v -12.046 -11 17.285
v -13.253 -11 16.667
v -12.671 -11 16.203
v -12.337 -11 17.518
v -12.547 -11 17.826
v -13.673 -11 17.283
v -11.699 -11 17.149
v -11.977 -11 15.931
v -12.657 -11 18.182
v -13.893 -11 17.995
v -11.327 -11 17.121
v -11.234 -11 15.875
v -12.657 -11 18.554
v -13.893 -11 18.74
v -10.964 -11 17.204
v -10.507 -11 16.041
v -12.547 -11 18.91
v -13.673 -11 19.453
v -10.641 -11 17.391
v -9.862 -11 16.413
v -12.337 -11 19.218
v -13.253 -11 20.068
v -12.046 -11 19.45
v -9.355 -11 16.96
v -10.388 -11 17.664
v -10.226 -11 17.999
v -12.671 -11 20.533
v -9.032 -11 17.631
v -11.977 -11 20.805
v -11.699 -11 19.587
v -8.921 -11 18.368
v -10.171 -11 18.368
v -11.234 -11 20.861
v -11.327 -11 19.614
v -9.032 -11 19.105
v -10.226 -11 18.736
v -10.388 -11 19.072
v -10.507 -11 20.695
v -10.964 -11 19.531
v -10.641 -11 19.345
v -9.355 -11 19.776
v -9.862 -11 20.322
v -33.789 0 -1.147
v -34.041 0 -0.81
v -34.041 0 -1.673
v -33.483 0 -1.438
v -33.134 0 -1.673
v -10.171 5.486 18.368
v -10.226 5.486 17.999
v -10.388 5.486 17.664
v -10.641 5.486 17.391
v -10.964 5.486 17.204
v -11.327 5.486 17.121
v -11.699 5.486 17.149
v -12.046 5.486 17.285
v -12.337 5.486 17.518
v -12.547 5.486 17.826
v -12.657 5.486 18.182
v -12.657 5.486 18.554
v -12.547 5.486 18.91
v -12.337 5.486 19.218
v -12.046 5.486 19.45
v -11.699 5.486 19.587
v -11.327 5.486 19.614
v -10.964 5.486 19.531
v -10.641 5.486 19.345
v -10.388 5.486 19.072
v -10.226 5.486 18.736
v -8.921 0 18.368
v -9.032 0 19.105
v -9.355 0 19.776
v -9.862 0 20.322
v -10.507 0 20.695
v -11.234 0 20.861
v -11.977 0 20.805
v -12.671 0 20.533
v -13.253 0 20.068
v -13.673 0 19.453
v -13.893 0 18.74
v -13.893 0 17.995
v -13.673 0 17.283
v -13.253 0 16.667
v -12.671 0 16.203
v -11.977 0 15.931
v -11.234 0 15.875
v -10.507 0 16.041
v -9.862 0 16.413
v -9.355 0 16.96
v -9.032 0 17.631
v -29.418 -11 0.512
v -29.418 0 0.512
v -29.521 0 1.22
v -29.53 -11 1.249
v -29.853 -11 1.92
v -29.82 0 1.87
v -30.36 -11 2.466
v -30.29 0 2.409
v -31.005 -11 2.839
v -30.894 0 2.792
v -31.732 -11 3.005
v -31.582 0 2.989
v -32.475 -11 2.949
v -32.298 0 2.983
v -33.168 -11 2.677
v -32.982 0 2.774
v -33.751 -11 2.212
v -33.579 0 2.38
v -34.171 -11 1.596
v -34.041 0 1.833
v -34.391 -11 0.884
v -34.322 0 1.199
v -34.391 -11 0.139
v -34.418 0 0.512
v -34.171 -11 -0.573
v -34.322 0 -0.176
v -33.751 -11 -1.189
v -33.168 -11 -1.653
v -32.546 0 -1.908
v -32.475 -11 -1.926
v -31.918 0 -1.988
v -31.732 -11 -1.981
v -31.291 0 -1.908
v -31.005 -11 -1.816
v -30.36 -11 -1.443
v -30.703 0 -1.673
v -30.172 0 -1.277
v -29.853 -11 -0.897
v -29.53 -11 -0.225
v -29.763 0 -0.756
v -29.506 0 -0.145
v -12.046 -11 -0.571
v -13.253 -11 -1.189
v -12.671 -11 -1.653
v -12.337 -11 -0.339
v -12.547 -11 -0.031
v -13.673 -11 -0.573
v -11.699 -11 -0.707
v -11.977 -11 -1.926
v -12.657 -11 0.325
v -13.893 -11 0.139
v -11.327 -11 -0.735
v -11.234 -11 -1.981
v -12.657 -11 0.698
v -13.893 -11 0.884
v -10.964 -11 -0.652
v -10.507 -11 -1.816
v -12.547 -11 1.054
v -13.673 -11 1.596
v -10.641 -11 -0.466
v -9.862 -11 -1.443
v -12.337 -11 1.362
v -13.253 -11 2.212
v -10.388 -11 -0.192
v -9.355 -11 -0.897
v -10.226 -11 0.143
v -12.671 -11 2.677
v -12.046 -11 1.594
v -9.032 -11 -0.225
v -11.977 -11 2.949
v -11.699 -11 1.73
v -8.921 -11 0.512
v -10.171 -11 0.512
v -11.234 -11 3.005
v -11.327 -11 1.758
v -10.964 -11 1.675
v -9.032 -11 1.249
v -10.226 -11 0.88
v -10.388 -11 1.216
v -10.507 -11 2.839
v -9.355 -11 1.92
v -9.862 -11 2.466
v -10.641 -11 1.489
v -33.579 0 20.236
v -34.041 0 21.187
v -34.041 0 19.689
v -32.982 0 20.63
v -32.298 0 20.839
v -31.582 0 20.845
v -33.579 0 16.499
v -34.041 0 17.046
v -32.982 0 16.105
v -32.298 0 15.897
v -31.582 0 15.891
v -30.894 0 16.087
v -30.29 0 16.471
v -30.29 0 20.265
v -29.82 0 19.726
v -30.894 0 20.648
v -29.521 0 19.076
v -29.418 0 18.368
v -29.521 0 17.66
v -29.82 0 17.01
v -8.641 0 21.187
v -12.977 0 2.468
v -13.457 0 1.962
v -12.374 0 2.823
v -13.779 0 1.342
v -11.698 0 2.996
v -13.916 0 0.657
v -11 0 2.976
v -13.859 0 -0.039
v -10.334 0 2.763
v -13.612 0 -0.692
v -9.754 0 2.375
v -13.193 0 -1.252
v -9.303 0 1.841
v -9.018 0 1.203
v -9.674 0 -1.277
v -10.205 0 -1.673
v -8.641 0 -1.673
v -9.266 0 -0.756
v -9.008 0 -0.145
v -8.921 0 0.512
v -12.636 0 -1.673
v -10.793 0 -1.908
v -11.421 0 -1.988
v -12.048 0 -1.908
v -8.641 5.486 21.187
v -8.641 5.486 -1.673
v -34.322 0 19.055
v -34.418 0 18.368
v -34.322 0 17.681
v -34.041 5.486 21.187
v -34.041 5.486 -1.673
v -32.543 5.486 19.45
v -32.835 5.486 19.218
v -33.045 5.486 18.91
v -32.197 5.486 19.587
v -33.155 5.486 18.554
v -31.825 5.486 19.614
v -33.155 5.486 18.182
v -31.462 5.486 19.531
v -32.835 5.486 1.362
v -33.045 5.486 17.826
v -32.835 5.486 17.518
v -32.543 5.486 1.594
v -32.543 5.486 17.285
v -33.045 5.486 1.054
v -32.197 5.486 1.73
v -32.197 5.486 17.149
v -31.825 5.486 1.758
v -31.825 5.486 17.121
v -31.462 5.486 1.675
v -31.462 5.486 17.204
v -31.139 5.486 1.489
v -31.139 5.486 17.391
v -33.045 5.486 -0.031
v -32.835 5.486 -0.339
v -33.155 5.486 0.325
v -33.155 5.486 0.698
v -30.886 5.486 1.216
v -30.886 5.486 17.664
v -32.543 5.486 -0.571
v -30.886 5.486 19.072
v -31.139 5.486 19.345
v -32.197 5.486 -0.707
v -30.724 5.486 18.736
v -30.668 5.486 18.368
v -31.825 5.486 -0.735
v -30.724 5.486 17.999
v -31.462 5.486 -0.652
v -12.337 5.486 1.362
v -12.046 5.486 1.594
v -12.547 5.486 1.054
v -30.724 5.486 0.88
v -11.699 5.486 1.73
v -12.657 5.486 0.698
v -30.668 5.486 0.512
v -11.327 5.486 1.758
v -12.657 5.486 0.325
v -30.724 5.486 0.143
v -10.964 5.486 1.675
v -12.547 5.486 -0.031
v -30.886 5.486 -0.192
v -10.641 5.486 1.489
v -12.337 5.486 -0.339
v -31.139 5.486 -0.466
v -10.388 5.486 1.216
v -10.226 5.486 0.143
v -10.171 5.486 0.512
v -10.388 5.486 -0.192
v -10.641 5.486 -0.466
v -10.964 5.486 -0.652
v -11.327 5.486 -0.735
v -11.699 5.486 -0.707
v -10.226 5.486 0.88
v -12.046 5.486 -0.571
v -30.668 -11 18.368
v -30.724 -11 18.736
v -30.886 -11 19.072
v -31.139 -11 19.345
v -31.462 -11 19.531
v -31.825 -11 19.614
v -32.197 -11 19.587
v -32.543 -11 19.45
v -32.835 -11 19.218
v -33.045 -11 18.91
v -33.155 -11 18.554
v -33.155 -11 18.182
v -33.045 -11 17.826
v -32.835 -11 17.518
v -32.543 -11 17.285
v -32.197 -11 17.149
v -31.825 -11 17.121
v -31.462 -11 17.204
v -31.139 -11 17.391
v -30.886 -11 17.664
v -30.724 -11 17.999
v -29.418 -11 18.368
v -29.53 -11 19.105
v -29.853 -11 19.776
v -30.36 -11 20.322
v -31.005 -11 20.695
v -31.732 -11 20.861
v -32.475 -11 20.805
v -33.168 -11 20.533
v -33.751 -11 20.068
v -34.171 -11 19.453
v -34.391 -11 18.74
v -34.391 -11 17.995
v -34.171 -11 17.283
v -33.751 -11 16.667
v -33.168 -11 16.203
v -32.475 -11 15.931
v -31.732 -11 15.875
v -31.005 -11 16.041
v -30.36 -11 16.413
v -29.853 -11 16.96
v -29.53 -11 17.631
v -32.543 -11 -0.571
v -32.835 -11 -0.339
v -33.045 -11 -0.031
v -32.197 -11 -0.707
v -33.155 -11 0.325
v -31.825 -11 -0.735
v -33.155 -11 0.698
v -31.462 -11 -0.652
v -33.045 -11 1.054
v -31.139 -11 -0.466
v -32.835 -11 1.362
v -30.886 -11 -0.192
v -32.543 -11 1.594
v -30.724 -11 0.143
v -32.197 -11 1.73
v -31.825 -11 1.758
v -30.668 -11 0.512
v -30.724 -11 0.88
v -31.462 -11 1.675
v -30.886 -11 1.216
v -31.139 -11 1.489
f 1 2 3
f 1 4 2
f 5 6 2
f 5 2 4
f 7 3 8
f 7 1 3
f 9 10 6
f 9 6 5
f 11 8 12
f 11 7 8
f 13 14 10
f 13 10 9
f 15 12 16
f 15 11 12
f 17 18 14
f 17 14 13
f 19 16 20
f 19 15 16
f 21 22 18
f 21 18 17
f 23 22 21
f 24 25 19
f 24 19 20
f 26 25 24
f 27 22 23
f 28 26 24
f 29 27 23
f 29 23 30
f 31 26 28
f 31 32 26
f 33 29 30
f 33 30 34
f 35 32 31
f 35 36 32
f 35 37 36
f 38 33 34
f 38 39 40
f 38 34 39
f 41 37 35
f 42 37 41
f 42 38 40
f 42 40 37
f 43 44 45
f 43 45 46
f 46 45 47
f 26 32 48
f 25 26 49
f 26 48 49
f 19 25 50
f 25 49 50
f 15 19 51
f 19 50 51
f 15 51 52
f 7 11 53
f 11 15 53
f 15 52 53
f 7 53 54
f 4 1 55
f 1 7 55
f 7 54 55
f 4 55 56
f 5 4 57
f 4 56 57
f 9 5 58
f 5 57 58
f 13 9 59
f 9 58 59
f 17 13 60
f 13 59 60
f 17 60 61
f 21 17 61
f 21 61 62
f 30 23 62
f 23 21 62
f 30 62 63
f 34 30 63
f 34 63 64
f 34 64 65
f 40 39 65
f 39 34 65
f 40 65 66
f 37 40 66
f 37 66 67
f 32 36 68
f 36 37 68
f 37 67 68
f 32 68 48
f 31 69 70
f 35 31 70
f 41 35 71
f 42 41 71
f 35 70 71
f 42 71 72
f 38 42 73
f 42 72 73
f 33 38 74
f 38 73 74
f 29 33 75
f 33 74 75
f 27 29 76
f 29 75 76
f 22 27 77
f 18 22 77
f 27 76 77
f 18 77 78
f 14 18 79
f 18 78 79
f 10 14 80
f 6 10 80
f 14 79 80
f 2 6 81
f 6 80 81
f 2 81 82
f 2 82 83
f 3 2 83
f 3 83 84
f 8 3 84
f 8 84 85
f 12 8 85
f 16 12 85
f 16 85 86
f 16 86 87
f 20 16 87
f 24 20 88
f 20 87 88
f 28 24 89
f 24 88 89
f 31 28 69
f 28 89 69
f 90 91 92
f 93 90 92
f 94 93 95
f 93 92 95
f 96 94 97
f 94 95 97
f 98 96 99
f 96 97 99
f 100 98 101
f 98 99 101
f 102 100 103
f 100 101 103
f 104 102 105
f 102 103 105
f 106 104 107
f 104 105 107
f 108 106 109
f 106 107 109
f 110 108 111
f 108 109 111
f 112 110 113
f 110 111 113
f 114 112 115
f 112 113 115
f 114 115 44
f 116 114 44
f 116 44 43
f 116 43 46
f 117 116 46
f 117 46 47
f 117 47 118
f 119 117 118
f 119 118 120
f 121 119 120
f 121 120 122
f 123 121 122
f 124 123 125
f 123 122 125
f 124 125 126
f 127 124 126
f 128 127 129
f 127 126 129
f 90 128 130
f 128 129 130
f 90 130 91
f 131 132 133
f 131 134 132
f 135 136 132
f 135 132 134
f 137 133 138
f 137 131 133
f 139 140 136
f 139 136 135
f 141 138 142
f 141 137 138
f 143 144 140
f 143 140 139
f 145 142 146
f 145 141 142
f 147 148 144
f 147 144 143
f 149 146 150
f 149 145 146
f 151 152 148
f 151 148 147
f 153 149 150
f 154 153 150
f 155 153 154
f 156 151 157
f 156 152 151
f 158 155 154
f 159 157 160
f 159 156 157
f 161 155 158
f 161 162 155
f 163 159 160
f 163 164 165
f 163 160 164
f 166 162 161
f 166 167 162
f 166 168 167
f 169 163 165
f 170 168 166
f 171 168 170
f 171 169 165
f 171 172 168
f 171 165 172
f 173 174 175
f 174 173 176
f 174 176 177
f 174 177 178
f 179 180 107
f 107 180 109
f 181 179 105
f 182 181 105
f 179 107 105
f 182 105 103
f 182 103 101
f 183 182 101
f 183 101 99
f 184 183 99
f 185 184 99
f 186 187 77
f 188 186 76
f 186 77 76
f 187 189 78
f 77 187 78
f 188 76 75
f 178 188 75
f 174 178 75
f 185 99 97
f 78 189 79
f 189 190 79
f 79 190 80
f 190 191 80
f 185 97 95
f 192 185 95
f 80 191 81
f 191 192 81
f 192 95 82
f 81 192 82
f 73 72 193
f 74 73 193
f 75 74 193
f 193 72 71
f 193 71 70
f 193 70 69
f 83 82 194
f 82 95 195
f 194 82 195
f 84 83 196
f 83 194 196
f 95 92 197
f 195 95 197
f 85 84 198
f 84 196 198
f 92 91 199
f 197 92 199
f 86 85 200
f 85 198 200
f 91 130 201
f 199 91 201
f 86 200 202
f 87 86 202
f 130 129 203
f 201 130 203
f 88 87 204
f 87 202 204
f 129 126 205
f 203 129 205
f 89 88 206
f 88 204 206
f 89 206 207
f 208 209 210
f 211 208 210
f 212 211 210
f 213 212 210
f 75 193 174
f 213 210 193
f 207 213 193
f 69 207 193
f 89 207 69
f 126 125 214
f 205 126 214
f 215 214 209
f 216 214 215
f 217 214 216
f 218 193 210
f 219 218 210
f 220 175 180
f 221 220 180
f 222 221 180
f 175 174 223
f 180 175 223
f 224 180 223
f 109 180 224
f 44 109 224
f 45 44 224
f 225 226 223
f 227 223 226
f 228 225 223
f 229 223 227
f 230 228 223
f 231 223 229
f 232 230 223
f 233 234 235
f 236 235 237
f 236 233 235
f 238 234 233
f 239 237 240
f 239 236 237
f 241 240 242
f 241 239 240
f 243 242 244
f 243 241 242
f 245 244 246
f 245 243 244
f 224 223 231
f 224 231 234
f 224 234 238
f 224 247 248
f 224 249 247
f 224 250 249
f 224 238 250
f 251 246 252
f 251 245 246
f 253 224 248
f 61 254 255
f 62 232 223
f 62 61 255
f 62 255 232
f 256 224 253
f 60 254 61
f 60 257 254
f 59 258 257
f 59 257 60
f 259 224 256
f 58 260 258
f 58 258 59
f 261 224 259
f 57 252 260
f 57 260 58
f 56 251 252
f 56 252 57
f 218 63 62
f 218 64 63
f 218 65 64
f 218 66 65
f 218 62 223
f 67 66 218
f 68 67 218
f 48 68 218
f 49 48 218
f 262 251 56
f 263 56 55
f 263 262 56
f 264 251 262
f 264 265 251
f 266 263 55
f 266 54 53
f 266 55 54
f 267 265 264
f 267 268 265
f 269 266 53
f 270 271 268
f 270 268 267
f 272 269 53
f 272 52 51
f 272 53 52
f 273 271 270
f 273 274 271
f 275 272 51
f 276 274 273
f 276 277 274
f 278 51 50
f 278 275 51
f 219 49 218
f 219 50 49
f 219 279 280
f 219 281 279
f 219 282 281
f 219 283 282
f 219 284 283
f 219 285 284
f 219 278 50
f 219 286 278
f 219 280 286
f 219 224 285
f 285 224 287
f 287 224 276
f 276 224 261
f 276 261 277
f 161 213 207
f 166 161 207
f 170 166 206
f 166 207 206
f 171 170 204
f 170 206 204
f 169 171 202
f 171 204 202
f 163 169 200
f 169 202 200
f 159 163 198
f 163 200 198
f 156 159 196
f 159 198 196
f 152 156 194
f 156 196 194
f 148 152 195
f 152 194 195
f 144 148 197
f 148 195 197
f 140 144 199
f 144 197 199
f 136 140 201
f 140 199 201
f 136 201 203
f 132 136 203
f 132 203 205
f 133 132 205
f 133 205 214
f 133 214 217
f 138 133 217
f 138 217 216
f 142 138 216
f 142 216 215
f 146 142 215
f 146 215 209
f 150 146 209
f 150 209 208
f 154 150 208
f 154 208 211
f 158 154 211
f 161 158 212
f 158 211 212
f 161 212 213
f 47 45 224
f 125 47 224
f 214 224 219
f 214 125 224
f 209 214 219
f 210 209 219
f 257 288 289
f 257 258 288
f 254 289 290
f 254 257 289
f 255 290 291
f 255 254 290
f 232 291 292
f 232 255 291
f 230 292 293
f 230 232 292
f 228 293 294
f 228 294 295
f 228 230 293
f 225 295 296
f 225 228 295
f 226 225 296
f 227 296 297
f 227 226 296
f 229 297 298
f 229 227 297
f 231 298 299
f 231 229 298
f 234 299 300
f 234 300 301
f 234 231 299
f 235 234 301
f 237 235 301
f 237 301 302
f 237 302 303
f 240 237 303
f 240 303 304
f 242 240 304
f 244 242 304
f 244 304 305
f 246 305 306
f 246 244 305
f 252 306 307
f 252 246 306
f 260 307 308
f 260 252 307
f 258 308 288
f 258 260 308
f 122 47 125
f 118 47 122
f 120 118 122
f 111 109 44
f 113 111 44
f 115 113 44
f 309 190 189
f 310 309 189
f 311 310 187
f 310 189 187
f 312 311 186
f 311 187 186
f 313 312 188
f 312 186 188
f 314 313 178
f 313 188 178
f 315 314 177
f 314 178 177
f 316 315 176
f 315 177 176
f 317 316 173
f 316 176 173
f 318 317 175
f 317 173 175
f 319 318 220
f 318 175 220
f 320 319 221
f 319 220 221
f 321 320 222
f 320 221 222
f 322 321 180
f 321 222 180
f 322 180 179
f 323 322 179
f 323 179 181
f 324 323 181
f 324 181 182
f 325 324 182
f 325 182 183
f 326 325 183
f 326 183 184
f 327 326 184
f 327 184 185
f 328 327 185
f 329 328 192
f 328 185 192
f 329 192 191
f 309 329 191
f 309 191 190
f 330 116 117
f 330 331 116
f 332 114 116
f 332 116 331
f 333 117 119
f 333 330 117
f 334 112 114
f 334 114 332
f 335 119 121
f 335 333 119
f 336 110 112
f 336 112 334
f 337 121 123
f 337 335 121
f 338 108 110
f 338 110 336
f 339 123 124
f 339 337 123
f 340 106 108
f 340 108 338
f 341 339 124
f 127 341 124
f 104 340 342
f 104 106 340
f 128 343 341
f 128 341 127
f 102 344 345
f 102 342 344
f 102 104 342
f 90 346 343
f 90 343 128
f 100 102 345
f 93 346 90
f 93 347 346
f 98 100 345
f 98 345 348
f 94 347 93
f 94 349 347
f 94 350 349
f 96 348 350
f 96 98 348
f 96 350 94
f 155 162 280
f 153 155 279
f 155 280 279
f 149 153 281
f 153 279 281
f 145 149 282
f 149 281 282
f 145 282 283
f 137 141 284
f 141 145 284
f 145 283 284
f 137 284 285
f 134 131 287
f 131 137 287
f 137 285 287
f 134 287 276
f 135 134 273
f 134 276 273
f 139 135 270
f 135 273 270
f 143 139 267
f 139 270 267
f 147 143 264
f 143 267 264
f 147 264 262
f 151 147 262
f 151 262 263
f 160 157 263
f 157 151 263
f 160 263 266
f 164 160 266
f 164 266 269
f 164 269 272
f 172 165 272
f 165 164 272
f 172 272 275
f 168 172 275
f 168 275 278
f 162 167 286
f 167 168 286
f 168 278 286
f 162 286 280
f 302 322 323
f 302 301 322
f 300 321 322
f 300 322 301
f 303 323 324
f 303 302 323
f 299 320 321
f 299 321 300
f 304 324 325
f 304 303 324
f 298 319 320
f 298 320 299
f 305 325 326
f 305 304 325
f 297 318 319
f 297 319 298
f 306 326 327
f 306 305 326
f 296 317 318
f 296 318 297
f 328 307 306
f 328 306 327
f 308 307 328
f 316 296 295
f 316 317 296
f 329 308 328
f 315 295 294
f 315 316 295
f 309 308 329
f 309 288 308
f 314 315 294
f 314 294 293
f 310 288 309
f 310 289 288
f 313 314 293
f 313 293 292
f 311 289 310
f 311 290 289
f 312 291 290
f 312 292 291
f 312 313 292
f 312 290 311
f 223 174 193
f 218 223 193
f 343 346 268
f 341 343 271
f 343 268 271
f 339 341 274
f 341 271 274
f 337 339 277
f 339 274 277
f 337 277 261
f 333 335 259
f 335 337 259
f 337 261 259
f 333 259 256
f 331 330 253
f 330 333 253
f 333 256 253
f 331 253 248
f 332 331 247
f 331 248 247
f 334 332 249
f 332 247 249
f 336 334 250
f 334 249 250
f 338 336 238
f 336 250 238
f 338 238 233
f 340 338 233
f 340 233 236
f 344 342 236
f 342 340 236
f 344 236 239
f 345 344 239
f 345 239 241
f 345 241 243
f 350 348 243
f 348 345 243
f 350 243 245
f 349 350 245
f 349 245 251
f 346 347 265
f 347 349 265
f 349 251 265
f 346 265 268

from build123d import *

# Parameters (mm, degrees)
SKETCH1_W               = 25.4
SKETCH1_H               = 22.86
BOSS_EXTRUDE1_DEPTH     = 5.4864
SKETCH2_R               = 2.5
SKETCH2_R_2             = 1.25
BOSS_EXTRUDE2_DEPTH     = 11
SKETCH5_R               = 1.25
CUT_EXTRUDE1_DEPTH      = 1
CUT_EXTRUDE1_DEPTH_BACK = 17.4864


with BuildPart() as part:
    # Sketch1 → Boss-Extrude1 (new body)
    with BuildSketch(Plane(origin=(0, 0, 0), x_dir=(1, 0, 0), z_dir=(0, 1, 0))):
        with Locations((-21.340699551, -9.756889686)):
            Rectangle(SKETCH1_W, SKETCH1_H)
    extrude(amount=BOSS_EXTRUDE1_DEPTH)

    # Sketch2 → Boss-Extrude2 (add)
    with BuildSketch(Plane.XZ):
        with Locations((-31.918497565, 18.367860399)):
            Circle(SKETCH2_R)
        with Locations((-31.918497565, 18.367860399)):
            Circle(SKETCH2_R_2, mode=Mode.SUBTRACT)
        with Locations((-31.918497565, 0.511660399)):
            Circle(SKETCH2_R)
        with Locations((-31.918497565, 0.511660399)):
            Circle(SKETCH2_R_2, mode=Mode.SUBTRACT)
        with Locations((-11.420697565, 0.511660399)):
            Circle(SKETCH2_R)
        with Locations((-11.420697565, 0.511660399)):
            Circle(SKETCH2_R_2, mode=Mode.SUBTRACT)
        with Locations((-11.420697565, 18.367860399)):
            Circle(SKETCH2_R)
        with Locations((-11.420697565, 18.367860399)):
            Circle(SKETCH2_R_2, mode=Mode.SUBTRACT)
    extrude(amount=BOSS_EXTRUDE2_DEPTH)

    # Sketch5 → Cut-Extrude1 (cut, two sides)
    with BuildSketch(Plane(origin=(0, 5.4864, 0), x_dir=(1, 0, 0), z_dir=(0, 1, 0))) as cut_extrude1_sk:
        with Locations((-31.918497565, -0.511660399)):
            Circle(SKETCH5_R)
        with Locations((-11.420697565, -0.511660399)):
            Circle(SKETCH5_R)
        with Locations((-11.420697565, -18.367860399)):
            Circle(SKETCH5_R)
        with Locations((-31.918497565, -18.367860399)):
            Circle(SKETCH5_R)
    extrude(amount=CUT_EXTRUDE1_DEPTH, mode=Mode.SUBTRACT)
    extrude(cut_extrude1_sk.sketch, amount=-CUT_EXTRUDE1_DEPTH_BACK, mode=Mode.SUBTRACT)


solid = part.part
